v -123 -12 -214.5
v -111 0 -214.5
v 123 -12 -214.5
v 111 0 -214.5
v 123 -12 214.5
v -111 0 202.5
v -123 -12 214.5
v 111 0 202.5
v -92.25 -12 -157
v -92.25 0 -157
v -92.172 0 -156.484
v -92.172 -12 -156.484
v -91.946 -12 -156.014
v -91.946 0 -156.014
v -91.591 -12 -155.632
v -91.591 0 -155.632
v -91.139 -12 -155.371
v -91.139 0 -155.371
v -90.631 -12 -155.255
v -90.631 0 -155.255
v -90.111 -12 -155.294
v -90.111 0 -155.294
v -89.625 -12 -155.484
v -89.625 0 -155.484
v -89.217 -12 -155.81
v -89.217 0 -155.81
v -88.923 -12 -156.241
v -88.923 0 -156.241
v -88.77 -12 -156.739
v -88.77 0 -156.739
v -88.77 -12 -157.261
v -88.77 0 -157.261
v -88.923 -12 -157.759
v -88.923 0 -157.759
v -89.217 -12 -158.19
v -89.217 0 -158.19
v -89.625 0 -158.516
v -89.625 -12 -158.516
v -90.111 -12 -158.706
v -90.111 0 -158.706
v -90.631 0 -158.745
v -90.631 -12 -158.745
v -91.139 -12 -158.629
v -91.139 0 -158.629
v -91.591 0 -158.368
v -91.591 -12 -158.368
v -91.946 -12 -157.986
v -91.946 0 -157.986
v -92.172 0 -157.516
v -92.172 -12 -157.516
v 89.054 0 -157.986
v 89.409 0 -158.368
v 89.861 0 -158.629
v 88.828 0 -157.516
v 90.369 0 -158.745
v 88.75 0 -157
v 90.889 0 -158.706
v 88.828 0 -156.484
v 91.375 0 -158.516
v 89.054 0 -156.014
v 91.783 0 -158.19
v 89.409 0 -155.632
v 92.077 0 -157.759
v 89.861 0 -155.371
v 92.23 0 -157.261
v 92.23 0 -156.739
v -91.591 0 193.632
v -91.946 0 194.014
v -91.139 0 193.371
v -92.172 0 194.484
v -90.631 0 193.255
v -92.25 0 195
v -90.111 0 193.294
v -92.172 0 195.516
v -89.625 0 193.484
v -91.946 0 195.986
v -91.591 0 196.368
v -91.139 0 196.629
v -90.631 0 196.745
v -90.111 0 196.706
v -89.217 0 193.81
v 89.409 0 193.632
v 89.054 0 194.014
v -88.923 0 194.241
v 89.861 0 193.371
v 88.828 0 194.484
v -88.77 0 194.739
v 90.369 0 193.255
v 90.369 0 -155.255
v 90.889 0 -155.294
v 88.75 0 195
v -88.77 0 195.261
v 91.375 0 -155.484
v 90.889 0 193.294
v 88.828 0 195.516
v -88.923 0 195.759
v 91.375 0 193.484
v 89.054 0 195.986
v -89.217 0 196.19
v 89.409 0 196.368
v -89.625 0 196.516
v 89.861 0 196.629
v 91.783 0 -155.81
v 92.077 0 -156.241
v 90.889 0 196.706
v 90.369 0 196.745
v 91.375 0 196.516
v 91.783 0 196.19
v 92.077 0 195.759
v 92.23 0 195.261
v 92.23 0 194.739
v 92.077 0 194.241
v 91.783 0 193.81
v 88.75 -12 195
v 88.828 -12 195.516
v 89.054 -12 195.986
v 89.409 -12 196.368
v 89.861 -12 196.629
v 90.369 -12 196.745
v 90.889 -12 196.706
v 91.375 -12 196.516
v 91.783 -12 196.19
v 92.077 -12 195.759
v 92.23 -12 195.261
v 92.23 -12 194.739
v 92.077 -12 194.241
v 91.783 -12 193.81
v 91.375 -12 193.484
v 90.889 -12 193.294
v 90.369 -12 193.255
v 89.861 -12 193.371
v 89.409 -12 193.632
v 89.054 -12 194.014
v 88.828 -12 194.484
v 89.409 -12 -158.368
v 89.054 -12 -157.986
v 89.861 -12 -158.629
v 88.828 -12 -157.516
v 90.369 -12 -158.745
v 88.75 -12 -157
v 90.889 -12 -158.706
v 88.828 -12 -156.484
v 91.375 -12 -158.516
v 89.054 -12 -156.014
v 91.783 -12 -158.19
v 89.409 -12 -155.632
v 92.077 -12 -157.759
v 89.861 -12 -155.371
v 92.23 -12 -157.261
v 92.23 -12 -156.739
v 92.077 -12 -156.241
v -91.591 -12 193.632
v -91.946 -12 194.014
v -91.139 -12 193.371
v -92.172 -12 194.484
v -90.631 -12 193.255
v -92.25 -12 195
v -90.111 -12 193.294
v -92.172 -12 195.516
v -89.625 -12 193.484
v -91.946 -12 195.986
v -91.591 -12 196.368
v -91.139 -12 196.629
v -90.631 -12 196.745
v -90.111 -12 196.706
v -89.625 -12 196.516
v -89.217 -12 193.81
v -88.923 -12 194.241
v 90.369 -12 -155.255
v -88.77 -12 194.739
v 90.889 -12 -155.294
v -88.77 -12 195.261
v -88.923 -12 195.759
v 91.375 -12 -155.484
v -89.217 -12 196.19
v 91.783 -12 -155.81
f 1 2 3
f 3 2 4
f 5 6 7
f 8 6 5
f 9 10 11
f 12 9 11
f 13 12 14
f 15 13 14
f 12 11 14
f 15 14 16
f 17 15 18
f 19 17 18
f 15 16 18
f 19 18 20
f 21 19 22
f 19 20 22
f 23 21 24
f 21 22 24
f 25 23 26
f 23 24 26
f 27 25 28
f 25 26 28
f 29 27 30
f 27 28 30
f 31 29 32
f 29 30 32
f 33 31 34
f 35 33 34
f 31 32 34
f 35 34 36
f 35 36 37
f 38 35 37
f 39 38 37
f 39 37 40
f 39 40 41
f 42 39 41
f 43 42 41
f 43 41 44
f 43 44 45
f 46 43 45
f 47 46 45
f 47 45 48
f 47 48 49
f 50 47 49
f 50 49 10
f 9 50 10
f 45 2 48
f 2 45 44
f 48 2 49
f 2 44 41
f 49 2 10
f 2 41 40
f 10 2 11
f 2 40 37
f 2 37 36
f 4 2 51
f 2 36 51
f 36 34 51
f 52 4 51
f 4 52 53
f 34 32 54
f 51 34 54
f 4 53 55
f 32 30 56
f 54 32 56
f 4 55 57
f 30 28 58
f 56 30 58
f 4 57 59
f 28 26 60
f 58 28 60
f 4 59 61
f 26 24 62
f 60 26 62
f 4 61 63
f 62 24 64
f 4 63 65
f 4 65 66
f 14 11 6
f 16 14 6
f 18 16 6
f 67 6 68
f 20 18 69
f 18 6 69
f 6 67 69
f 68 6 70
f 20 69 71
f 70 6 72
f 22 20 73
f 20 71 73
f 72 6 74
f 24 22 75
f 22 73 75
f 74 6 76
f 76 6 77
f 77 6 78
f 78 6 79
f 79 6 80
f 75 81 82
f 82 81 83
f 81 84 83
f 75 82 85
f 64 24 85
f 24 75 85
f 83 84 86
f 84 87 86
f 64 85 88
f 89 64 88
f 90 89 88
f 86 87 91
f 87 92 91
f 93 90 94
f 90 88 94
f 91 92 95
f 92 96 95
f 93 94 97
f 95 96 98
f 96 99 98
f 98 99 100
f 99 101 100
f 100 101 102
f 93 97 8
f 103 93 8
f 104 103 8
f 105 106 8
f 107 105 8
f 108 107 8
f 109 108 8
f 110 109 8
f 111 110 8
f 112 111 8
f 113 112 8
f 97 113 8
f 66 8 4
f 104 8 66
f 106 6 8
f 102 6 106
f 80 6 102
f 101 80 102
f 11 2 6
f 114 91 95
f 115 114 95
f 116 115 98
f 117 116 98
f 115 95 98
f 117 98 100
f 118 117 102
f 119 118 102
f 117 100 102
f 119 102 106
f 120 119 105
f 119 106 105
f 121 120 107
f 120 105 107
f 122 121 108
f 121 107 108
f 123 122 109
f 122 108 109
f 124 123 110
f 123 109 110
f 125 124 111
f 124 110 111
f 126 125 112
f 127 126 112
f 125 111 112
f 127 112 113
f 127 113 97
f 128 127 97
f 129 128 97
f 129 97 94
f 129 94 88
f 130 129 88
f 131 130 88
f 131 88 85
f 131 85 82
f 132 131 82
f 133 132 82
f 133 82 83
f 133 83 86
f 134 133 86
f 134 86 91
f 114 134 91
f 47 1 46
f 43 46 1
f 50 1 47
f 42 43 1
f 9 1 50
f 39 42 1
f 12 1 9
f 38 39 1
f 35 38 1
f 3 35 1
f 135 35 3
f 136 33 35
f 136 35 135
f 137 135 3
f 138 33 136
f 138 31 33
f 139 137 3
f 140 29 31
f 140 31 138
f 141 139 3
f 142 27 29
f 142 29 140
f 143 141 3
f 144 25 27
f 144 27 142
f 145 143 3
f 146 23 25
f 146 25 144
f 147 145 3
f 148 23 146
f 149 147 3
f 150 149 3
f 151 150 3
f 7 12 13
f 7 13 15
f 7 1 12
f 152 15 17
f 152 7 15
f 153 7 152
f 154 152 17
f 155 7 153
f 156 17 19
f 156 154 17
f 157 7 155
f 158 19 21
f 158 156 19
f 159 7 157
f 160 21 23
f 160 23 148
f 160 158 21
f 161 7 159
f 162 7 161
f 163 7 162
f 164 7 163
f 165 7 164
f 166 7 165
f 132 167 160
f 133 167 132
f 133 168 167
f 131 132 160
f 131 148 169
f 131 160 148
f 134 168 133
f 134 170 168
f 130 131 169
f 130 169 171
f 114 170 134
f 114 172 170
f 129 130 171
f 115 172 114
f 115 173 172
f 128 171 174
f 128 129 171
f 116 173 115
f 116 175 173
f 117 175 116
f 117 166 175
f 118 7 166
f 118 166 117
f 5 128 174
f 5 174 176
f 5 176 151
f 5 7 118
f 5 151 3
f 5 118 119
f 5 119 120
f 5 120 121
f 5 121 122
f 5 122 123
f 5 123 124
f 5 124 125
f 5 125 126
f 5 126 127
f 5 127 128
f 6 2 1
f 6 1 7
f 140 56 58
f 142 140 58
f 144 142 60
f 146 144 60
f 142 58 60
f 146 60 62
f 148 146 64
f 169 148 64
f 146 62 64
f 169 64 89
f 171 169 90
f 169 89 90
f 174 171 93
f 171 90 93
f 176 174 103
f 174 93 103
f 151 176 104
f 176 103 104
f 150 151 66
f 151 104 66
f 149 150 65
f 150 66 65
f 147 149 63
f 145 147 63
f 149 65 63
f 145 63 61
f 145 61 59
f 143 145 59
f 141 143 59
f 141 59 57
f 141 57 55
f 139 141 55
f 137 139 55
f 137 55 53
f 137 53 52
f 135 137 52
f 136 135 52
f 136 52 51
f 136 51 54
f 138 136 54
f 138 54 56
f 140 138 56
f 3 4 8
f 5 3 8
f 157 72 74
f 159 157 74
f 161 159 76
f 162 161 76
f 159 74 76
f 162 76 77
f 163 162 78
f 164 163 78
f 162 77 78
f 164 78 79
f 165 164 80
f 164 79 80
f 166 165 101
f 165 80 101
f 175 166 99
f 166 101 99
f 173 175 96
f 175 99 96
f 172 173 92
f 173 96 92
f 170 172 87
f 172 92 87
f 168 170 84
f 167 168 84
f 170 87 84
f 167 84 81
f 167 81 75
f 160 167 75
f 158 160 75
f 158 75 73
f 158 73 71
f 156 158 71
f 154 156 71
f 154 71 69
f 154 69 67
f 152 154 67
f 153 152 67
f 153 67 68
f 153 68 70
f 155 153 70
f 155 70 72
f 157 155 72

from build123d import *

# Parameters (mm, degrees)
F0_W     = 246
F0_H     = 429
F1_DEPTH = 12
F2_SIZE  = 11.99999
F4_D     = 3.5


# Not quite as in the source:
# - a fillet or chamfer is up to 0.001 mm smaller than in the source, because OpenCascade refuses the exact size
# - a feature names something its author has since deleted; it is built from what else it names


with BuildPart() as f1:
    # F0 (on Front) → F1 (new body)
    with BuildSketch(Plane.XZ):
        Rectangle(F0_W, F0_H)
    extrude(amount=F1_DEPTH)

    # F2 (size 12 in the source; OpenCascade refuses exactly that, so slightly less here)
    f2_edges = [f1.edges().sort_by_distance(p)[0] for p in [
        (123, 0, 0),
        (0, 0, 214.5),
        (-123, 0, 0),
    ]]
    chamfer(f2_edges, length=F2_SIZE)

    # F4 (through all)
    with Locations(Plane.XZ.offset(12)):
        with Locations((-90.5, 195), (90.5, 195), (-90.5, -157), (90.5, -157)):
            Hole(F4_D / 2)


solid = f1.part
